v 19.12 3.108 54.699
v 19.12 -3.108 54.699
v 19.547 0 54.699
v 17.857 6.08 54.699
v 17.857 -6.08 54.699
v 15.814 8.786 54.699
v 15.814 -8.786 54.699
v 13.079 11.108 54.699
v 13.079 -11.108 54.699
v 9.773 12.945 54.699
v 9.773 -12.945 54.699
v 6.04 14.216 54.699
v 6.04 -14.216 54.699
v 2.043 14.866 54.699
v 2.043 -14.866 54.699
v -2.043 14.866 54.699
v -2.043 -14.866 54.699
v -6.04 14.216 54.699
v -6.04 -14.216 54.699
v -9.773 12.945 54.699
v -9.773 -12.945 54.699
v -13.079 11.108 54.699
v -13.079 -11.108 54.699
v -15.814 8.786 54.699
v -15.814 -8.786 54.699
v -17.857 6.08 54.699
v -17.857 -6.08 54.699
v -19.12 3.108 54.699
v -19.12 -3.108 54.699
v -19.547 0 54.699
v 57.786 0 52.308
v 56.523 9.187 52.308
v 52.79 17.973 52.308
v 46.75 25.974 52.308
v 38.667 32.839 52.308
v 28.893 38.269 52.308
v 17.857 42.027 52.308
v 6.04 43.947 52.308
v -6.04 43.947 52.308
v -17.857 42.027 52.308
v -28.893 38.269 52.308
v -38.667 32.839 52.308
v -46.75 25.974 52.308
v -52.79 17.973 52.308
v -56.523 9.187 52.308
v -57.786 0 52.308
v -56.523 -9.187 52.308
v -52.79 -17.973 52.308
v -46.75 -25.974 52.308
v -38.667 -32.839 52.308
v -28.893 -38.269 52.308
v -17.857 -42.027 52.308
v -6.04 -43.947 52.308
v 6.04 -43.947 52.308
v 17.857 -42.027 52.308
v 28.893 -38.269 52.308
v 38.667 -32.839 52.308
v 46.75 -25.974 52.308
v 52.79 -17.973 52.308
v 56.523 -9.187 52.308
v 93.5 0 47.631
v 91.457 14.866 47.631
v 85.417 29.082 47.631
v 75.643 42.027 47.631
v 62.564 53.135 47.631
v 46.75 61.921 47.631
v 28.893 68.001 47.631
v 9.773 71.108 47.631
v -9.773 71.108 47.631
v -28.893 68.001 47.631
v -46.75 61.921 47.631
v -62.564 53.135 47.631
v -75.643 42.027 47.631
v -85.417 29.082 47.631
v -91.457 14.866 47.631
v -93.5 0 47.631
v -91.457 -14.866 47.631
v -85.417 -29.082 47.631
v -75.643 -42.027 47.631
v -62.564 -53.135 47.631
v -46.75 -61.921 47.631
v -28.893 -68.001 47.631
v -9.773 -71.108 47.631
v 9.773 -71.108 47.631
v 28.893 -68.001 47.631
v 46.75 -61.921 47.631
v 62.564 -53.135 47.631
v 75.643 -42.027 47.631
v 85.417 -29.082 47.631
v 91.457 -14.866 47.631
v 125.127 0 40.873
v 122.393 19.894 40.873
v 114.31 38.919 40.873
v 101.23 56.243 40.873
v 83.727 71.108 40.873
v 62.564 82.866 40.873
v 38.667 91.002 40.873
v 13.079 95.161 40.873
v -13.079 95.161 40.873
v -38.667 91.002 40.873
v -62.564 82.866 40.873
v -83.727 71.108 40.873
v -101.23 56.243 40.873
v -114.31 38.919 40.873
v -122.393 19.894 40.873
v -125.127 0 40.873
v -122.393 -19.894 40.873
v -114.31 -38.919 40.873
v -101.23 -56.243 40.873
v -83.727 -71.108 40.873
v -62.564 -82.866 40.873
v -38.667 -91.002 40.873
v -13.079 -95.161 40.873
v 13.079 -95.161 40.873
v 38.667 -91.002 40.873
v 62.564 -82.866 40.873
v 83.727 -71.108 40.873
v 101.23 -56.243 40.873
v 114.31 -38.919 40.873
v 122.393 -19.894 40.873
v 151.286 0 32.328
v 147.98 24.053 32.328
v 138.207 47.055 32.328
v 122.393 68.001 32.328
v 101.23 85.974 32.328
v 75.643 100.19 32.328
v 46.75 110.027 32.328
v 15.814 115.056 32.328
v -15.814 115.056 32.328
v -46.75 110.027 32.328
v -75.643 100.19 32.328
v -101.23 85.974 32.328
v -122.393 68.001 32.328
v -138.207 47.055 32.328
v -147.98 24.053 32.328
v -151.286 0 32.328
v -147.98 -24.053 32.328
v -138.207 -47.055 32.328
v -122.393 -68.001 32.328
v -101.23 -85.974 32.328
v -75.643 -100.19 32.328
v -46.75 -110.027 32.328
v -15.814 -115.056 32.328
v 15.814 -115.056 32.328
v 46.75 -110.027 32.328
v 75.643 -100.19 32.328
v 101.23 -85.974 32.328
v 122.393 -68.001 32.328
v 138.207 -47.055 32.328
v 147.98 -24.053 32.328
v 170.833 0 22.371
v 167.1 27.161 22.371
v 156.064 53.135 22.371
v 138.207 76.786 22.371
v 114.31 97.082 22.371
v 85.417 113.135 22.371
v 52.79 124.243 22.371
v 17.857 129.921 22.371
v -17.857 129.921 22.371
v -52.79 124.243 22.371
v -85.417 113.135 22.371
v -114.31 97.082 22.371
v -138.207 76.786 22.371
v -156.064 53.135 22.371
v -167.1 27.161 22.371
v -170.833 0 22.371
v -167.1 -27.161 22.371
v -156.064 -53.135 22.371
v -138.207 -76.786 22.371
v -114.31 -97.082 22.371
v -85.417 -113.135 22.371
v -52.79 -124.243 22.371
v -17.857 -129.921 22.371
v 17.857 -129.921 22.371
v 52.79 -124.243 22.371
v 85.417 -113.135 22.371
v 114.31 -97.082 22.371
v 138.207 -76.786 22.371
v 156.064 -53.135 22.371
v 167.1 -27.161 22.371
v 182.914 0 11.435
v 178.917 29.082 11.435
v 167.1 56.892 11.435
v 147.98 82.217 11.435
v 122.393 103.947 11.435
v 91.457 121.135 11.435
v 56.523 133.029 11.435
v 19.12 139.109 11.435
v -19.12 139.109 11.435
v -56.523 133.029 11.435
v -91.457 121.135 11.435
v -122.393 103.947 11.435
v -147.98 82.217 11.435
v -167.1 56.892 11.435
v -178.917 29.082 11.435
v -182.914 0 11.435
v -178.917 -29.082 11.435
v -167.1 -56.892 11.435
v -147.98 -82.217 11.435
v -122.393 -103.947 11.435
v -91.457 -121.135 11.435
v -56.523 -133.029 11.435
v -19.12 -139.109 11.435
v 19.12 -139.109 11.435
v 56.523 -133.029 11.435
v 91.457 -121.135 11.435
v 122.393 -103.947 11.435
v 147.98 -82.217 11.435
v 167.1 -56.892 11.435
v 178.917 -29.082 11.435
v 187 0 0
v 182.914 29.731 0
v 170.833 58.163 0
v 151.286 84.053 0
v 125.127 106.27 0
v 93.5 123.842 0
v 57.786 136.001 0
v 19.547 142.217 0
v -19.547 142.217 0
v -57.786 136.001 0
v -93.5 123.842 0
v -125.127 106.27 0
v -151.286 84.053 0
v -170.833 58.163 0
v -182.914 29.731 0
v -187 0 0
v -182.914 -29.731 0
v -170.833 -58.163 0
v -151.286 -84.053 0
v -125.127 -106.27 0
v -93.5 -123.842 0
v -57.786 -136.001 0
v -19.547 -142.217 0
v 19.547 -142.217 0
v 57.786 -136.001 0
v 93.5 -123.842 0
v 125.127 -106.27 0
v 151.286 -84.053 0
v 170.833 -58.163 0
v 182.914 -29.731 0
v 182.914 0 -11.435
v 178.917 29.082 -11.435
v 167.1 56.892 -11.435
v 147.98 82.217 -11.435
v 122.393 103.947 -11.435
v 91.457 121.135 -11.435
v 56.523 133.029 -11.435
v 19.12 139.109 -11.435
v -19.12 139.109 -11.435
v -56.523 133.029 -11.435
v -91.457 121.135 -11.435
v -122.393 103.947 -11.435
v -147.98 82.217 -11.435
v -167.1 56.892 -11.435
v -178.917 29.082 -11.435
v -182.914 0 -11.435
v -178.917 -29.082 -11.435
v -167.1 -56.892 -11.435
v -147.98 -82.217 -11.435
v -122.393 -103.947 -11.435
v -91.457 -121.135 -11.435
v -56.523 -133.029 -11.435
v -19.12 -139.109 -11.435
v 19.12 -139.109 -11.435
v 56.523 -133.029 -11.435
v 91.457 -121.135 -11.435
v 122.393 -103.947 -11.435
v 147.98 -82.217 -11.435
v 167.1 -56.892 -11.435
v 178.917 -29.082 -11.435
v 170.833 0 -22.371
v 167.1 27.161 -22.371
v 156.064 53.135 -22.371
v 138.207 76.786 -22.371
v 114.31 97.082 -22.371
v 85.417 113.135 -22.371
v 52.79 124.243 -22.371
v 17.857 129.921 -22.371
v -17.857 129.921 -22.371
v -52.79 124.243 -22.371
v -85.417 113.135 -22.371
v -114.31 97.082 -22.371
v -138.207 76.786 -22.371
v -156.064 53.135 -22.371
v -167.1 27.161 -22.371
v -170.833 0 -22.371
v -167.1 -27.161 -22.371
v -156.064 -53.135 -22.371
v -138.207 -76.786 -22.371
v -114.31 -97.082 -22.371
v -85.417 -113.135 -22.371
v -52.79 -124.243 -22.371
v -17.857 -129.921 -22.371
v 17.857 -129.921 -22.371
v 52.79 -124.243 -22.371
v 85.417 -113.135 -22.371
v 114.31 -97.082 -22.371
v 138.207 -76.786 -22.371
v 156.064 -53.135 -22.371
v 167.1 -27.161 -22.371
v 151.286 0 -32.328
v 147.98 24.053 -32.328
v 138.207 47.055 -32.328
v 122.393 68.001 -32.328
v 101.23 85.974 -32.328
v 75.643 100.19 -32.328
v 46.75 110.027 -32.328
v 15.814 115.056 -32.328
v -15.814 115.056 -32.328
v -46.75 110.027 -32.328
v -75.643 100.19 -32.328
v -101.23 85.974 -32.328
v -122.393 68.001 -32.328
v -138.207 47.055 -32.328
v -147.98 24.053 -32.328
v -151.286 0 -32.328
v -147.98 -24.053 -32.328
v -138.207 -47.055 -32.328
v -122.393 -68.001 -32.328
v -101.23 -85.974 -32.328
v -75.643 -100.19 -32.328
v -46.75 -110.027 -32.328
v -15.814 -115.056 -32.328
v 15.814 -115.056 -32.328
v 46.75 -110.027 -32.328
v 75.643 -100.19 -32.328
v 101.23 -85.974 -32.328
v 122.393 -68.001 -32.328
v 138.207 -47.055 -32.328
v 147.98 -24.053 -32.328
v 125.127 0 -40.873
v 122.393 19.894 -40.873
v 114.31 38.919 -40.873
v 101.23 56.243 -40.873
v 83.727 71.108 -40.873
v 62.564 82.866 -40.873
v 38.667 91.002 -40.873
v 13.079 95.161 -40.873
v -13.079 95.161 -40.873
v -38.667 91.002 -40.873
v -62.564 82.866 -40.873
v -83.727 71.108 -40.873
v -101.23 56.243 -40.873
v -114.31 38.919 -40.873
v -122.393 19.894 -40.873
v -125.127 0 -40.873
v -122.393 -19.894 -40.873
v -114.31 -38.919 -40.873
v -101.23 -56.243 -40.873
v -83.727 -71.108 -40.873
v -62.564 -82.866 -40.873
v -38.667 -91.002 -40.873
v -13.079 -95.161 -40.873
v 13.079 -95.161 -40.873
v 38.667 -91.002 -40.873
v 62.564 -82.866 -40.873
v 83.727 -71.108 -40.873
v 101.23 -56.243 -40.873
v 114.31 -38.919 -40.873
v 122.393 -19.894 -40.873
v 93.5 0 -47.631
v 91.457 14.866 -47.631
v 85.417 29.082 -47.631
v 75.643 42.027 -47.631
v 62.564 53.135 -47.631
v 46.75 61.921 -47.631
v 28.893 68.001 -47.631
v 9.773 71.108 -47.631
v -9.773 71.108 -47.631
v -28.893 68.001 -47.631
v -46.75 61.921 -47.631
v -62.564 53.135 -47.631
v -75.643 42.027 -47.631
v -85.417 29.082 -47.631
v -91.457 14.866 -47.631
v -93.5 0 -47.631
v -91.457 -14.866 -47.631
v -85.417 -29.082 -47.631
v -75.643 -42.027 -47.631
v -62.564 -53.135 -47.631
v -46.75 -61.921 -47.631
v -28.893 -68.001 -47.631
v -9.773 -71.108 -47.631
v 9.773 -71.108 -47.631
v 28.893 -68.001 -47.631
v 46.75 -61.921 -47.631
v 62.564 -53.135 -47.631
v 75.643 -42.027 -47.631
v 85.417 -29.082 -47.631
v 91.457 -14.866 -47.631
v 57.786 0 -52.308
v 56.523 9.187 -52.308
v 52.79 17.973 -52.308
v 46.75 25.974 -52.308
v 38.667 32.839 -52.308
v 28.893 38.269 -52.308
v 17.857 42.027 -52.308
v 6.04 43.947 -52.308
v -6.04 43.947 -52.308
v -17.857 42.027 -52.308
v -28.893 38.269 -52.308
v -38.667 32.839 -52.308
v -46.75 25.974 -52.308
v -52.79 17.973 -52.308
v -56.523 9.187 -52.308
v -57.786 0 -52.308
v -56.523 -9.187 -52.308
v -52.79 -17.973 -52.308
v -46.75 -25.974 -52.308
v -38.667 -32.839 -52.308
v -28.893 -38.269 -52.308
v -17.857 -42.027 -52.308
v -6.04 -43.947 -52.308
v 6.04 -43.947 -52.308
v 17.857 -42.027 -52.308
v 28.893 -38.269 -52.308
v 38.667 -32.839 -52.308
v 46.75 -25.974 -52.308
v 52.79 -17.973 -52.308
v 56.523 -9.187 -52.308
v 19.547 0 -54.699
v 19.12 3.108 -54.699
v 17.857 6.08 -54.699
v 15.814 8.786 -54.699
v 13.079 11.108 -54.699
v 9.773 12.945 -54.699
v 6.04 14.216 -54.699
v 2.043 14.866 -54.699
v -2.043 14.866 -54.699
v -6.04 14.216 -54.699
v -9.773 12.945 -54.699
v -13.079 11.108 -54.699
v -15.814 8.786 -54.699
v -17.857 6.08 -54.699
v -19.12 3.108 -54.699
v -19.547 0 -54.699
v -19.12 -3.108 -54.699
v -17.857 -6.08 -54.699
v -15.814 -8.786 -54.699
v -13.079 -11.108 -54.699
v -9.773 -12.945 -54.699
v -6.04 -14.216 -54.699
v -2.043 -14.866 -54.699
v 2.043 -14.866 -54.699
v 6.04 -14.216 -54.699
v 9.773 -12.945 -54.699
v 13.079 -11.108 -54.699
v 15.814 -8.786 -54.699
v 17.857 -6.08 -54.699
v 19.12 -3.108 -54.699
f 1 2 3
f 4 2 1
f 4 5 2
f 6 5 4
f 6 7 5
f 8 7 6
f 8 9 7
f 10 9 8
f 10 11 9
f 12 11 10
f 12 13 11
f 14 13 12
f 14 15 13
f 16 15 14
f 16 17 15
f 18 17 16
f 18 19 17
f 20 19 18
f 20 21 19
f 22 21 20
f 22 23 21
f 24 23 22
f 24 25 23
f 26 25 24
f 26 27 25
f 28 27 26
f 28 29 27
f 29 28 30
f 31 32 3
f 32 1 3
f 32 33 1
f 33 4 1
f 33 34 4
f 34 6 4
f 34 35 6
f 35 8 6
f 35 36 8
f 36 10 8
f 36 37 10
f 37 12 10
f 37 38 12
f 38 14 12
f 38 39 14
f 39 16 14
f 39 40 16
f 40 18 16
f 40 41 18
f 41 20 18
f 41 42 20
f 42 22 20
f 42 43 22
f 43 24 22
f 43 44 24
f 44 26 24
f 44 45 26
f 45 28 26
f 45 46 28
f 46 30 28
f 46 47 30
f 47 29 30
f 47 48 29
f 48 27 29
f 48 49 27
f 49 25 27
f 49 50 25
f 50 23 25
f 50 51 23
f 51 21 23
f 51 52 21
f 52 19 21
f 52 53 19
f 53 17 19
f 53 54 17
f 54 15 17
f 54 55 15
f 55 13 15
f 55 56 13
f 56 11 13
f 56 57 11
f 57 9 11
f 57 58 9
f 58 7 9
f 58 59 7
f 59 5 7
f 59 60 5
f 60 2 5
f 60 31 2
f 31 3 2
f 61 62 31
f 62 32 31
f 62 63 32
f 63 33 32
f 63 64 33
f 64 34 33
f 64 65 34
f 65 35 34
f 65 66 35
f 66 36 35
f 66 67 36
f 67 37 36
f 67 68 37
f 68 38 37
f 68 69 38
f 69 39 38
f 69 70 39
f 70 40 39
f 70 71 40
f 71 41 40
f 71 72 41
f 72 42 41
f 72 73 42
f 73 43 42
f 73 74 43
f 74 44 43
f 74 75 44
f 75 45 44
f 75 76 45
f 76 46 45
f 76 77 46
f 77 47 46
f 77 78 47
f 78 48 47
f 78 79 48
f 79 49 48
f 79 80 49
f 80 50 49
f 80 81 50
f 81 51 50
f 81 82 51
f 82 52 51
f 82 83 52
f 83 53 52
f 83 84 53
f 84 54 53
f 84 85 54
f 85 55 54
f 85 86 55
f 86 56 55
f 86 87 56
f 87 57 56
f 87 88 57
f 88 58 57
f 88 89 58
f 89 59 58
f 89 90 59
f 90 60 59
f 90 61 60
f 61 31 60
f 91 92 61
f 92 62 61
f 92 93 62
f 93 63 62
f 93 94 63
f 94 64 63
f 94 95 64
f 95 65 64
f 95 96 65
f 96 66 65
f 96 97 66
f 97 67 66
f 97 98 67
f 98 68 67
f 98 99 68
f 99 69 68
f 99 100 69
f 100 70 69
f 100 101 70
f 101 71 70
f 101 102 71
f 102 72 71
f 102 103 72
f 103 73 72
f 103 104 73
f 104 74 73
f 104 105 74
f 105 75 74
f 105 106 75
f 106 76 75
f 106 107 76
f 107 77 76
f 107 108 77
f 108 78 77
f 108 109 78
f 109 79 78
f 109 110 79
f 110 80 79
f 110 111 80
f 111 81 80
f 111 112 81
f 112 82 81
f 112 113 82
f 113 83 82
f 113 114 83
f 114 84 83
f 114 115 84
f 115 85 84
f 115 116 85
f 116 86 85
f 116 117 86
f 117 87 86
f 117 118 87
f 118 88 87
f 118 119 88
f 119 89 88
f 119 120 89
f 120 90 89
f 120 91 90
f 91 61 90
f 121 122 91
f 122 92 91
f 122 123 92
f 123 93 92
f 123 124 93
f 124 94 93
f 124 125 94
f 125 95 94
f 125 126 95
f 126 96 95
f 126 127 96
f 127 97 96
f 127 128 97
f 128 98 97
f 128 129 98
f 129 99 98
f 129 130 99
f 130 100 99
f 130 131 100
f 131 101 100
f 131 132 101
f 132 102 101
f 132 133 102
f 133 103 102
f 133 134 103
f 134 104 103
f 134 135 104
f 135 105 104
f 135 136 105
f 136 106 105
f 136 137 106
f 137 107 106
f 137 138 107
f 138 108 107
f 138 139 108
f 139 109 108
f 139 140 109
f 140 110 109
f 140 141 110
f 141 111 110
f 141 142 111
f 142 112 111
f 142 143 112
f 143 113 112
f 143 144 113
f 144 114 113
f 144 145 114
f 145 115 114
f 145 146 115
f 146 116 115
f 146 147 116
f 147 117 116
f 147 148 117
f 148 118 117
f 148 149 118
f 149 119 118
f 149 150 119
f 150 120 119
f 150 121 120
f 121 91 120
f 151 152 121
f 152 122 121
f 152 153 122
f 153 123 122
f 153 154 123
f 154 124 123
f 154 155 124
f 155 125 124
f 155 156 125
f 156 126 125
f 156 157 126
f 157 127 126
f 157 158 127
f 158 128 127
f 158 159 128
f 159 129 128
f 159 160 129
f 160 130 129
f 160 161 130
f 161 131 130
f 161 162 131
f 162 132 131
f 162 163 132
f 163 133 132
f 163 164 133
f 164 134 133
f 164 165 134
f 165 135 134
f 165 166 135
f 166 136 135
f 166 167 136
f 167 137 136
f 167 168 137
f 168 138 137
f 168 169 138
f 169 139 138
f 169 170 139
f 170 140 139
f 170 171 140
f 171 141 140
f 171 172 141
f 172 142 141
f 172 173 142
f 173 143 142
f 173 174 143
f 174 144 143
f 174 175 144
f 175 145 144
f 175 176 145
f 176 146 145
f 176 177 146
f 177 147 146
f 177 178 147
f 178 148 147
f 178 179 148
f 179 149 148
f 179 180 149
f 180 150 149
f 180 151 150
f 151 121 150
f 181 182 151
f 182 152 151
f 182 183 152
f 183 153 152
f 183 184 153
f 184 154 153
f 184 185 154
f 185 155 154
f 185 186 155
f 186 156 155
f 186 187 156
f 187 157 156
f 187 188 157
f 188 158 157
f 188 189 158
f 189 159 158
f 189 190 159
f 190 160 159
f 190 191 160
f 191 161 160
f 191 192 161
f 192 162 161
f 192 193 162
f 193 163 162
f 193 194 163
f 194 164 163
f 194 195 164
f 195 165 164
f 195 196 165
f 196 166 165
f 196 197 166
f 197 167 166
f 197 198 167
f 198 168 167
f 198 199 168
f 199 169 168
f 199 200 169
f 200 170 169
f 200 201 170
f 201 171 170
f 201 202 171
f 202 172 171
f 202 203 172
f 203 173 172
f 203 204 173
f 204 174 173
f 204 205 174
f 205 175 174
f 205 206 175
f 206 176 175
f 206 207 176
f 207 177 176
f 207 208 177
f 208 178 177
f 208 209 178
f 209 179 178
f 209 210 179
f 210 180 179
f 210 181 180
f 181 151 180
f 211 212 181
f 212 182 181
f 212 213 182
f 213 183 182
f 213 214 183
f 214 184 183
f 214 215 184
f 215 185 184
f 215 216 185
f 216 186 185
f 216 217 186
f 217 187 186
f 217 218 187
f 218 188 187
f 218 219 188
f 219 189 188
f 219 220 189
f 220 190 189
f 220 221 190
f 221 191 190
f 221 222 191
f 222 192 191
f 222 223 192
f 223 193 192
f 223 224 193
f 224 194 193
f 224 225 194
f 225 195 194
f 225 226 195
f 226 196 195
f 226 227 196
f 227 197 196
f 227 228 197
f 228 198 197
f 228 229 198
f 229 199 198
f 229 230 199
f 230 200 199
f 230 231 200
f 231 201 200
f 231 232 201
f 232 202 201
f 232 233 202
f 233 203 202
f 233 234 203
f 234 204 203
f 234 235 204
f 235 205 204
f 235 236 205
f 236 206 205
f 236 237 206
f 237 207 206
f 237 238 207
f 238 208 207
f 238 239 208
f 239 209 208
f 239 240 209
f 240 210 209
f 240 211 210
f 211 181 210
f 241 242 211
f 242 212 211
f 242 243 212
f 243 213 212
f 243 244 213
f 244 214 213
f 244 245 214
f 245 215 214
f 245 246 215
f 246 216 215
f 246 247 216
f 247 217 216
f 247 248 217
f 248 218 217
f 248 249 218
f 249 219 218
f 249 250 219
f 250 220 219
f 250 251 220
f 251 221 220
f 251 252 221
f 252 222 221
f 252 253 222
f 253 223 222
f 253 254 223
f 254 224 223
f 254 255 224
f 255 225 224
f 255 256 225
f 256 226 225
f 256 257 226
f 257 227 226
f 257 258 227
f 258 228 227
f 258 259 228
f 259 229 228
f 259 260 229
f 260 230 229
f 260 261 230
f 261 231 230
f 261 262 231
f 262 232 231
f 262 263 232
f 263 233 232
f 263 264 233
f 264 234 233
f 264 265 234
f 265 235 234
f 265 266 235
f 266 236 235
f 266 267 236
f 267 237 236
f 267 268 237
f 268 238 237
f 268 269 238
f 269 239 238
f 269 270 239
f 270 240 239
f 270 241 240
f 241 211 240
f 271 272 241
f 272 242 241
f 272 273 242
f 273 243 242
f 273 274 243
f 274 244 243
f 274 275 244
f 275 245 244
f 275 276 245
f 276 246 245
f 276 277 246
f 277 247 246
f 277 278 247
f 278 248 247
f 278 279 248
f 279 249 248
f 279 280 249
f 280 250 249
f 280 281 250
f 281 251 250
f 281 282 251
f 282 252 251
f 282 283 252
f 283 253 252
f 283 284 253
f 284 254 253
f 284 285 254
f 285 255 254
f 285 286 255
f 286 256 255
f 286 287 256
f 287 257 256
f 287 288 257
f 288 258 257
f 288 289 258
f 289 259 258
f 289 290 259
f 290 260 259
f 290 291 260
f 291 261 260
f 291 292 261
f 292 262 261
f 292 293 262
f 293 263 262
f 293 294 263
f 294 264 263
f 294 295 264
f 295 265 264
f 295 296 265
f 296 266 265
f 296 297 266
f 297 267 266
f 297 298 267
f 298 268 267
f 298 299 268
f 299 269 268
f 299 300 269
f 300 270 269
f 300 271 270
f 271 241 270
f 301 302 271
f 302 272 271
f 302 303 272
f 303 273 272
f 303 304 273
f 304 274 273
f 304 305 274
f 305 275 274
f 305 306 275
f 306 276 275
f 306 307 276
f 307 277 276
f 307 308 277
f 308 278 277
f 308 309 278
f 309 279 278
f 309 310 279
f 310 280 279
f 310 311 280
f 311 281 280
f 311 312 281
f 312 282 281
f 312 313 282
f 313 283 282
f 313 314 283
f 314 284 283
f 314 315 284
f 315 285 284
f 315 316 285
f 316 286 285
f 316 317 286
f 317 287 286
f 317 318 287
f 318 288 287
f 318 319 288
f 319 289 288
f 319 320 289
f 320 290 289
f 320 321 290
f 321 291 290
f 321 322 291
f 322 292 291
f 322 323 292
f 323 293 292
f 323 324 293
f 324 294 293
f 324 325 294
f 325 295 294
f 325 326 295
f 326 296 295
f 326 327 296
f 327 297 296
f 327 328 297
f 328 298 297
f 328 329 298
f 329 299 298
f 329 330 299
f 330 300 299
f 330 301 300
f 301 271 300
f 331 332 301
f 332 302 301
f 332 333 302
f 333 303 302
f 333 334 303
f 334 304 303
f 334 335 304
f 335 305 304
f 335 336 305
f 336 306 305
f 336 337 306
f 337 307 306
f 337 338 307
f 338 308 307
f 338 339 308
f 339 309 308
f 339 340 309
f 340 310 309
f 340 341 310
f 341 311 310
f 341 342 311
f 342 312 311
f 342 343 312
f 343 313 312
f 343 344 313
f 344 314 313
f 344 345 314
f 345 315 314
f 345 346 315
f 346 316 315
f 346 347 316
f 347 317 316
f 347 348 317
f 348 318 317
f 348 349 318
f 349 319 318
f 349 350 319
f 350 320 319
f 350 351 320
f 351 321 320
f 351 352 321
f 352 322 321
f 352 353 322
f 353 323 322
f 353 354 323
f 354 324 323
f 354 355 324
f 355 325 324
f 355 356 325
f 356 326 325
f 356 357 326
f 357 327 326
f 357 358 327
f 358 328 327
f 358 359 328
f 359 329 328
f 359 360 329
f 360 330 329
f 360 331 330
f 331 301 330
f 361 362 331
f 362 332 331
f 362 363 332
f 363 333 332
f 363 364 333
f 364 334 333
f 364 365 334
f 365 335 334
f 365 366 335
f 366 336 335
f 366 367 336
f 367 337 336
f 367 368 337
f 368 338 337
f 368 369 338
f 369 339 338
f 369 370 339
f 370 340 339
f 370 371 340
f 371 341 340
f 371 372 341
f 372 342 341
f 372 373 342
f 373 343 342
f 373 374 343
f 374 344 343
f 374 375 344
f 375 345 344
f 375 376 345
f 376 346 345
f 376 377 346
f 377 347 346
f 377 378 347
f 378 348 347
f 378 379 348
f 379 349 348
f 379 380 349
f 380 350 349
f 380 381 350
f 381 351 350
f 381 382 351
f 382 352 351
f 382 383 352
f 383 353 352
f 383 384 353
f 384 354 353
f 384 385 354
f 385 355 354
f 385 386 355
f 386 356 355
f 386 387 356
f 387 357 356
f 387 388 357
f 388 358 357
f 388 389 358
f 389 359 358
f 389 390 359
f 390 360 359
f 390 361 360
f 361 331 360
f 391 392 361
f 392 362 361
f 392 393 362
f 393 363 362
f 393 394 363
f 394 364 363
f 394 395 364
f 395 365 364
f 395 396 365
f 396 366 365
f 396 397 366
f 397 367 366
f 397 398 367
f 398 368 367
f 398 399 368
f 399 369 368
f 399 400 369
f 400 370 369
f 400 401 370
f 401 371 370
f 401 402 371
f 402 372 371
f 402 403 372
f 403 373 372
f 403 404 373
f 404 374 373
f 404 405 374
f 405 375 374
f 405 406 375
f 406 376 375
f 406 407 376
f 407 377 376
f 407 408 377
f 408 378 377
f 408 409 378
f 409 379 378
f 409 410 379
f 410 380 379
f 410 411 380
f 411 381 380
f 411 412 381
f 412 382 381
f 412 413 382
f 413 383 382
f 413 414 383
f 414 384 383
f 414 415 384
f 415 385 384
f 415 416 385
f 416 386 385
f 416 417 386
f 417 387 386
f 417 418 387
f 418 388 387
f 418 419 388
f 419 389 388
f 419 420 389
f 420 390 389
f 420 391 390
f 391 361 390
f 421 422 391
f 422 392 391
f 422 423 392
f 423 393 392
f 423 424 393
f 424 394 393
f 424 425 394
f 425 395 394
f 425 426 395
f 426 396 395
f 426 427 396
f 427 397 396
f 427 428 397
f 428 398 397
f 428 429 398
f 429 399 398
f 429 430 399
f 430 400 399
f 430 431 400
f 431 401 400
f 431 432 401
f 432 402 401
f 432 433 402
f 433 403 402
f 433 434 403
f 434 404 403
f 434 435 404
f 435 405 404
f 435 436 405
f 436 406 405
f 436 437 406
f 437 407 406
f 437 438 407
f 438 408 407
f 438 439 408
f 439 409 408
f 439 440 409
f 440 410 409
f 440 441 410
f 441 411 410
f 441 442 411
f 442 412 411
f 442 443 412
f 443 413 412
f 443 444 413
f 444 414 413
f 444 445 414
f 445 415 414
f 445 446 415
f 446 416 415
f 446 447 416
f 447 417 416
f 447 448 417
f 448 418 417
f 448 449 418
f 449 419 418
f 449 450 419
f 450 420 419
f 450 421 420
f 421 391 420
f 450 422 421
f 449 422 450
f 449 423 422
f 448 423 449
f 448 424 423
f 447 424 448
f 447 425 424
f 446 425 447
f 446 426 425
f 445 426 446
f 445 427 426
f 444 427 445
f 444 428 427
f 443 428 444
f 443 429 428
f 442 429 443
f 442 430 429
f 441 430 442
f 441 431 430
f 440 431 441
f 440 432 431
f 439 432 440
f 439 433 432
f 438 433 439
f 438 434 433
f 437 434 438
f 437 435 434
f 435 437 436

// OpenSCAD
// Generated by SolidPython 1.0.1 on 2020-07-29 00:46:53


scale(v = [17, 13, 5]) {
	sphere(r = 11);
}
/***********************************************
*********      SolidPython code:      **********
************************************************
 
# import packages: SolidPython
from solid import *
from solid.utils import *
from itertools import chain, combinations, permutations


class Resize:

    def __init__(self, scad_file):
        self.scad_file = scad_file
        #self.scad_file = import_scad(scad_file)
        # cone/cylinder param:
        self.r1 = 0
        self.r2 = 0
        self.h = 0
        # rectangular prism param:
        self.w = 0
        self.l = 0
        # ellipse param:
        self.r = 0

    # import OpenScad code (file name corresponds to shape)


    # classify shape + parameters
    def assign(self, param1, param2, param3):
        if self.scad_file == 'cone.scad':
            self.r1 = param1
            self.r2 = param2
            self.h = param3
        elif self.scad_file == 'cylinder.scad':
            self.r1 = param1
            self.r2 = param2
            self.h = param3
        elif self.scad_file == 'rectangularPrism.scad':
            self.h = param1
            self.l = param2
            self.w = param3
        else:
            self.r = param1
            self.h = param2

    # resize parameters
    def iterate(self):
        x = range(3, 20, 2)
        i = 1
        if self.scad_file == 'cone.scad':
            tempList = list(permutations(x, 2))
            for temp in tempList:
                param1 = temp[0]
                param2 = temp[1]
                filepath = 'produced_scad_files/' + 'cone' + str(param1) + '_' + str(param2) + '_' + '.scad'
                scad_render_to_file(cylinder(h=param1, r1=param2, r2=0), filepath)

        elif self.scad_file == 'cylinder.scad':
            tempList = list(permutations(x, 3))
            for temp in tempList:
                param1 = temp[0]
                param2 = temp[1]
                filepath = 'produced_scad_files/' + 'cylinder' + str(param1) + '_' + str(param2) + '_' + '.scad'
                scad_render_to_file(cylinder(h=param1, r1=param2, r2=param2), filepath)

        elif self.scad_file == 'rectangularPrism.scad':
            tempList = list(permutations(x, 3))
            for temp in tempList:
                param1 = temp[0]
                param2 = temp[1]
                param3 = temp[2]
                filepath = 'produced_scad_files/' + 'rectangularPrism' + str(param1) + '_' + str(param2) + '_' + str(
                    param3) + '.scad'
                scad_render_to_file(cube(size=(param1, param2, param3)), filepath)

        elif self.scad_file == 'ellipse.scad':
            tempList = list(permutations(x, 4))
            for temp in tempList:
                param1 = temp[0]
                param2 = temp[1]
                param3 = temp[2]
                param4 = temp[3]
                filepath = 'produced_scad_files/' + 'ellipse' + str(param1) + '_' + str(param2) + '_' + str(param3) + '_' + str(param4) + '.scad'
                scad_render_to_file(scale([param1, param2, param3])(sphere(r=param4)), filepath)

    def render_to_scadfile(self):
        scad_render_to_file(scad, 'example.scad') 
 
************************************************/
